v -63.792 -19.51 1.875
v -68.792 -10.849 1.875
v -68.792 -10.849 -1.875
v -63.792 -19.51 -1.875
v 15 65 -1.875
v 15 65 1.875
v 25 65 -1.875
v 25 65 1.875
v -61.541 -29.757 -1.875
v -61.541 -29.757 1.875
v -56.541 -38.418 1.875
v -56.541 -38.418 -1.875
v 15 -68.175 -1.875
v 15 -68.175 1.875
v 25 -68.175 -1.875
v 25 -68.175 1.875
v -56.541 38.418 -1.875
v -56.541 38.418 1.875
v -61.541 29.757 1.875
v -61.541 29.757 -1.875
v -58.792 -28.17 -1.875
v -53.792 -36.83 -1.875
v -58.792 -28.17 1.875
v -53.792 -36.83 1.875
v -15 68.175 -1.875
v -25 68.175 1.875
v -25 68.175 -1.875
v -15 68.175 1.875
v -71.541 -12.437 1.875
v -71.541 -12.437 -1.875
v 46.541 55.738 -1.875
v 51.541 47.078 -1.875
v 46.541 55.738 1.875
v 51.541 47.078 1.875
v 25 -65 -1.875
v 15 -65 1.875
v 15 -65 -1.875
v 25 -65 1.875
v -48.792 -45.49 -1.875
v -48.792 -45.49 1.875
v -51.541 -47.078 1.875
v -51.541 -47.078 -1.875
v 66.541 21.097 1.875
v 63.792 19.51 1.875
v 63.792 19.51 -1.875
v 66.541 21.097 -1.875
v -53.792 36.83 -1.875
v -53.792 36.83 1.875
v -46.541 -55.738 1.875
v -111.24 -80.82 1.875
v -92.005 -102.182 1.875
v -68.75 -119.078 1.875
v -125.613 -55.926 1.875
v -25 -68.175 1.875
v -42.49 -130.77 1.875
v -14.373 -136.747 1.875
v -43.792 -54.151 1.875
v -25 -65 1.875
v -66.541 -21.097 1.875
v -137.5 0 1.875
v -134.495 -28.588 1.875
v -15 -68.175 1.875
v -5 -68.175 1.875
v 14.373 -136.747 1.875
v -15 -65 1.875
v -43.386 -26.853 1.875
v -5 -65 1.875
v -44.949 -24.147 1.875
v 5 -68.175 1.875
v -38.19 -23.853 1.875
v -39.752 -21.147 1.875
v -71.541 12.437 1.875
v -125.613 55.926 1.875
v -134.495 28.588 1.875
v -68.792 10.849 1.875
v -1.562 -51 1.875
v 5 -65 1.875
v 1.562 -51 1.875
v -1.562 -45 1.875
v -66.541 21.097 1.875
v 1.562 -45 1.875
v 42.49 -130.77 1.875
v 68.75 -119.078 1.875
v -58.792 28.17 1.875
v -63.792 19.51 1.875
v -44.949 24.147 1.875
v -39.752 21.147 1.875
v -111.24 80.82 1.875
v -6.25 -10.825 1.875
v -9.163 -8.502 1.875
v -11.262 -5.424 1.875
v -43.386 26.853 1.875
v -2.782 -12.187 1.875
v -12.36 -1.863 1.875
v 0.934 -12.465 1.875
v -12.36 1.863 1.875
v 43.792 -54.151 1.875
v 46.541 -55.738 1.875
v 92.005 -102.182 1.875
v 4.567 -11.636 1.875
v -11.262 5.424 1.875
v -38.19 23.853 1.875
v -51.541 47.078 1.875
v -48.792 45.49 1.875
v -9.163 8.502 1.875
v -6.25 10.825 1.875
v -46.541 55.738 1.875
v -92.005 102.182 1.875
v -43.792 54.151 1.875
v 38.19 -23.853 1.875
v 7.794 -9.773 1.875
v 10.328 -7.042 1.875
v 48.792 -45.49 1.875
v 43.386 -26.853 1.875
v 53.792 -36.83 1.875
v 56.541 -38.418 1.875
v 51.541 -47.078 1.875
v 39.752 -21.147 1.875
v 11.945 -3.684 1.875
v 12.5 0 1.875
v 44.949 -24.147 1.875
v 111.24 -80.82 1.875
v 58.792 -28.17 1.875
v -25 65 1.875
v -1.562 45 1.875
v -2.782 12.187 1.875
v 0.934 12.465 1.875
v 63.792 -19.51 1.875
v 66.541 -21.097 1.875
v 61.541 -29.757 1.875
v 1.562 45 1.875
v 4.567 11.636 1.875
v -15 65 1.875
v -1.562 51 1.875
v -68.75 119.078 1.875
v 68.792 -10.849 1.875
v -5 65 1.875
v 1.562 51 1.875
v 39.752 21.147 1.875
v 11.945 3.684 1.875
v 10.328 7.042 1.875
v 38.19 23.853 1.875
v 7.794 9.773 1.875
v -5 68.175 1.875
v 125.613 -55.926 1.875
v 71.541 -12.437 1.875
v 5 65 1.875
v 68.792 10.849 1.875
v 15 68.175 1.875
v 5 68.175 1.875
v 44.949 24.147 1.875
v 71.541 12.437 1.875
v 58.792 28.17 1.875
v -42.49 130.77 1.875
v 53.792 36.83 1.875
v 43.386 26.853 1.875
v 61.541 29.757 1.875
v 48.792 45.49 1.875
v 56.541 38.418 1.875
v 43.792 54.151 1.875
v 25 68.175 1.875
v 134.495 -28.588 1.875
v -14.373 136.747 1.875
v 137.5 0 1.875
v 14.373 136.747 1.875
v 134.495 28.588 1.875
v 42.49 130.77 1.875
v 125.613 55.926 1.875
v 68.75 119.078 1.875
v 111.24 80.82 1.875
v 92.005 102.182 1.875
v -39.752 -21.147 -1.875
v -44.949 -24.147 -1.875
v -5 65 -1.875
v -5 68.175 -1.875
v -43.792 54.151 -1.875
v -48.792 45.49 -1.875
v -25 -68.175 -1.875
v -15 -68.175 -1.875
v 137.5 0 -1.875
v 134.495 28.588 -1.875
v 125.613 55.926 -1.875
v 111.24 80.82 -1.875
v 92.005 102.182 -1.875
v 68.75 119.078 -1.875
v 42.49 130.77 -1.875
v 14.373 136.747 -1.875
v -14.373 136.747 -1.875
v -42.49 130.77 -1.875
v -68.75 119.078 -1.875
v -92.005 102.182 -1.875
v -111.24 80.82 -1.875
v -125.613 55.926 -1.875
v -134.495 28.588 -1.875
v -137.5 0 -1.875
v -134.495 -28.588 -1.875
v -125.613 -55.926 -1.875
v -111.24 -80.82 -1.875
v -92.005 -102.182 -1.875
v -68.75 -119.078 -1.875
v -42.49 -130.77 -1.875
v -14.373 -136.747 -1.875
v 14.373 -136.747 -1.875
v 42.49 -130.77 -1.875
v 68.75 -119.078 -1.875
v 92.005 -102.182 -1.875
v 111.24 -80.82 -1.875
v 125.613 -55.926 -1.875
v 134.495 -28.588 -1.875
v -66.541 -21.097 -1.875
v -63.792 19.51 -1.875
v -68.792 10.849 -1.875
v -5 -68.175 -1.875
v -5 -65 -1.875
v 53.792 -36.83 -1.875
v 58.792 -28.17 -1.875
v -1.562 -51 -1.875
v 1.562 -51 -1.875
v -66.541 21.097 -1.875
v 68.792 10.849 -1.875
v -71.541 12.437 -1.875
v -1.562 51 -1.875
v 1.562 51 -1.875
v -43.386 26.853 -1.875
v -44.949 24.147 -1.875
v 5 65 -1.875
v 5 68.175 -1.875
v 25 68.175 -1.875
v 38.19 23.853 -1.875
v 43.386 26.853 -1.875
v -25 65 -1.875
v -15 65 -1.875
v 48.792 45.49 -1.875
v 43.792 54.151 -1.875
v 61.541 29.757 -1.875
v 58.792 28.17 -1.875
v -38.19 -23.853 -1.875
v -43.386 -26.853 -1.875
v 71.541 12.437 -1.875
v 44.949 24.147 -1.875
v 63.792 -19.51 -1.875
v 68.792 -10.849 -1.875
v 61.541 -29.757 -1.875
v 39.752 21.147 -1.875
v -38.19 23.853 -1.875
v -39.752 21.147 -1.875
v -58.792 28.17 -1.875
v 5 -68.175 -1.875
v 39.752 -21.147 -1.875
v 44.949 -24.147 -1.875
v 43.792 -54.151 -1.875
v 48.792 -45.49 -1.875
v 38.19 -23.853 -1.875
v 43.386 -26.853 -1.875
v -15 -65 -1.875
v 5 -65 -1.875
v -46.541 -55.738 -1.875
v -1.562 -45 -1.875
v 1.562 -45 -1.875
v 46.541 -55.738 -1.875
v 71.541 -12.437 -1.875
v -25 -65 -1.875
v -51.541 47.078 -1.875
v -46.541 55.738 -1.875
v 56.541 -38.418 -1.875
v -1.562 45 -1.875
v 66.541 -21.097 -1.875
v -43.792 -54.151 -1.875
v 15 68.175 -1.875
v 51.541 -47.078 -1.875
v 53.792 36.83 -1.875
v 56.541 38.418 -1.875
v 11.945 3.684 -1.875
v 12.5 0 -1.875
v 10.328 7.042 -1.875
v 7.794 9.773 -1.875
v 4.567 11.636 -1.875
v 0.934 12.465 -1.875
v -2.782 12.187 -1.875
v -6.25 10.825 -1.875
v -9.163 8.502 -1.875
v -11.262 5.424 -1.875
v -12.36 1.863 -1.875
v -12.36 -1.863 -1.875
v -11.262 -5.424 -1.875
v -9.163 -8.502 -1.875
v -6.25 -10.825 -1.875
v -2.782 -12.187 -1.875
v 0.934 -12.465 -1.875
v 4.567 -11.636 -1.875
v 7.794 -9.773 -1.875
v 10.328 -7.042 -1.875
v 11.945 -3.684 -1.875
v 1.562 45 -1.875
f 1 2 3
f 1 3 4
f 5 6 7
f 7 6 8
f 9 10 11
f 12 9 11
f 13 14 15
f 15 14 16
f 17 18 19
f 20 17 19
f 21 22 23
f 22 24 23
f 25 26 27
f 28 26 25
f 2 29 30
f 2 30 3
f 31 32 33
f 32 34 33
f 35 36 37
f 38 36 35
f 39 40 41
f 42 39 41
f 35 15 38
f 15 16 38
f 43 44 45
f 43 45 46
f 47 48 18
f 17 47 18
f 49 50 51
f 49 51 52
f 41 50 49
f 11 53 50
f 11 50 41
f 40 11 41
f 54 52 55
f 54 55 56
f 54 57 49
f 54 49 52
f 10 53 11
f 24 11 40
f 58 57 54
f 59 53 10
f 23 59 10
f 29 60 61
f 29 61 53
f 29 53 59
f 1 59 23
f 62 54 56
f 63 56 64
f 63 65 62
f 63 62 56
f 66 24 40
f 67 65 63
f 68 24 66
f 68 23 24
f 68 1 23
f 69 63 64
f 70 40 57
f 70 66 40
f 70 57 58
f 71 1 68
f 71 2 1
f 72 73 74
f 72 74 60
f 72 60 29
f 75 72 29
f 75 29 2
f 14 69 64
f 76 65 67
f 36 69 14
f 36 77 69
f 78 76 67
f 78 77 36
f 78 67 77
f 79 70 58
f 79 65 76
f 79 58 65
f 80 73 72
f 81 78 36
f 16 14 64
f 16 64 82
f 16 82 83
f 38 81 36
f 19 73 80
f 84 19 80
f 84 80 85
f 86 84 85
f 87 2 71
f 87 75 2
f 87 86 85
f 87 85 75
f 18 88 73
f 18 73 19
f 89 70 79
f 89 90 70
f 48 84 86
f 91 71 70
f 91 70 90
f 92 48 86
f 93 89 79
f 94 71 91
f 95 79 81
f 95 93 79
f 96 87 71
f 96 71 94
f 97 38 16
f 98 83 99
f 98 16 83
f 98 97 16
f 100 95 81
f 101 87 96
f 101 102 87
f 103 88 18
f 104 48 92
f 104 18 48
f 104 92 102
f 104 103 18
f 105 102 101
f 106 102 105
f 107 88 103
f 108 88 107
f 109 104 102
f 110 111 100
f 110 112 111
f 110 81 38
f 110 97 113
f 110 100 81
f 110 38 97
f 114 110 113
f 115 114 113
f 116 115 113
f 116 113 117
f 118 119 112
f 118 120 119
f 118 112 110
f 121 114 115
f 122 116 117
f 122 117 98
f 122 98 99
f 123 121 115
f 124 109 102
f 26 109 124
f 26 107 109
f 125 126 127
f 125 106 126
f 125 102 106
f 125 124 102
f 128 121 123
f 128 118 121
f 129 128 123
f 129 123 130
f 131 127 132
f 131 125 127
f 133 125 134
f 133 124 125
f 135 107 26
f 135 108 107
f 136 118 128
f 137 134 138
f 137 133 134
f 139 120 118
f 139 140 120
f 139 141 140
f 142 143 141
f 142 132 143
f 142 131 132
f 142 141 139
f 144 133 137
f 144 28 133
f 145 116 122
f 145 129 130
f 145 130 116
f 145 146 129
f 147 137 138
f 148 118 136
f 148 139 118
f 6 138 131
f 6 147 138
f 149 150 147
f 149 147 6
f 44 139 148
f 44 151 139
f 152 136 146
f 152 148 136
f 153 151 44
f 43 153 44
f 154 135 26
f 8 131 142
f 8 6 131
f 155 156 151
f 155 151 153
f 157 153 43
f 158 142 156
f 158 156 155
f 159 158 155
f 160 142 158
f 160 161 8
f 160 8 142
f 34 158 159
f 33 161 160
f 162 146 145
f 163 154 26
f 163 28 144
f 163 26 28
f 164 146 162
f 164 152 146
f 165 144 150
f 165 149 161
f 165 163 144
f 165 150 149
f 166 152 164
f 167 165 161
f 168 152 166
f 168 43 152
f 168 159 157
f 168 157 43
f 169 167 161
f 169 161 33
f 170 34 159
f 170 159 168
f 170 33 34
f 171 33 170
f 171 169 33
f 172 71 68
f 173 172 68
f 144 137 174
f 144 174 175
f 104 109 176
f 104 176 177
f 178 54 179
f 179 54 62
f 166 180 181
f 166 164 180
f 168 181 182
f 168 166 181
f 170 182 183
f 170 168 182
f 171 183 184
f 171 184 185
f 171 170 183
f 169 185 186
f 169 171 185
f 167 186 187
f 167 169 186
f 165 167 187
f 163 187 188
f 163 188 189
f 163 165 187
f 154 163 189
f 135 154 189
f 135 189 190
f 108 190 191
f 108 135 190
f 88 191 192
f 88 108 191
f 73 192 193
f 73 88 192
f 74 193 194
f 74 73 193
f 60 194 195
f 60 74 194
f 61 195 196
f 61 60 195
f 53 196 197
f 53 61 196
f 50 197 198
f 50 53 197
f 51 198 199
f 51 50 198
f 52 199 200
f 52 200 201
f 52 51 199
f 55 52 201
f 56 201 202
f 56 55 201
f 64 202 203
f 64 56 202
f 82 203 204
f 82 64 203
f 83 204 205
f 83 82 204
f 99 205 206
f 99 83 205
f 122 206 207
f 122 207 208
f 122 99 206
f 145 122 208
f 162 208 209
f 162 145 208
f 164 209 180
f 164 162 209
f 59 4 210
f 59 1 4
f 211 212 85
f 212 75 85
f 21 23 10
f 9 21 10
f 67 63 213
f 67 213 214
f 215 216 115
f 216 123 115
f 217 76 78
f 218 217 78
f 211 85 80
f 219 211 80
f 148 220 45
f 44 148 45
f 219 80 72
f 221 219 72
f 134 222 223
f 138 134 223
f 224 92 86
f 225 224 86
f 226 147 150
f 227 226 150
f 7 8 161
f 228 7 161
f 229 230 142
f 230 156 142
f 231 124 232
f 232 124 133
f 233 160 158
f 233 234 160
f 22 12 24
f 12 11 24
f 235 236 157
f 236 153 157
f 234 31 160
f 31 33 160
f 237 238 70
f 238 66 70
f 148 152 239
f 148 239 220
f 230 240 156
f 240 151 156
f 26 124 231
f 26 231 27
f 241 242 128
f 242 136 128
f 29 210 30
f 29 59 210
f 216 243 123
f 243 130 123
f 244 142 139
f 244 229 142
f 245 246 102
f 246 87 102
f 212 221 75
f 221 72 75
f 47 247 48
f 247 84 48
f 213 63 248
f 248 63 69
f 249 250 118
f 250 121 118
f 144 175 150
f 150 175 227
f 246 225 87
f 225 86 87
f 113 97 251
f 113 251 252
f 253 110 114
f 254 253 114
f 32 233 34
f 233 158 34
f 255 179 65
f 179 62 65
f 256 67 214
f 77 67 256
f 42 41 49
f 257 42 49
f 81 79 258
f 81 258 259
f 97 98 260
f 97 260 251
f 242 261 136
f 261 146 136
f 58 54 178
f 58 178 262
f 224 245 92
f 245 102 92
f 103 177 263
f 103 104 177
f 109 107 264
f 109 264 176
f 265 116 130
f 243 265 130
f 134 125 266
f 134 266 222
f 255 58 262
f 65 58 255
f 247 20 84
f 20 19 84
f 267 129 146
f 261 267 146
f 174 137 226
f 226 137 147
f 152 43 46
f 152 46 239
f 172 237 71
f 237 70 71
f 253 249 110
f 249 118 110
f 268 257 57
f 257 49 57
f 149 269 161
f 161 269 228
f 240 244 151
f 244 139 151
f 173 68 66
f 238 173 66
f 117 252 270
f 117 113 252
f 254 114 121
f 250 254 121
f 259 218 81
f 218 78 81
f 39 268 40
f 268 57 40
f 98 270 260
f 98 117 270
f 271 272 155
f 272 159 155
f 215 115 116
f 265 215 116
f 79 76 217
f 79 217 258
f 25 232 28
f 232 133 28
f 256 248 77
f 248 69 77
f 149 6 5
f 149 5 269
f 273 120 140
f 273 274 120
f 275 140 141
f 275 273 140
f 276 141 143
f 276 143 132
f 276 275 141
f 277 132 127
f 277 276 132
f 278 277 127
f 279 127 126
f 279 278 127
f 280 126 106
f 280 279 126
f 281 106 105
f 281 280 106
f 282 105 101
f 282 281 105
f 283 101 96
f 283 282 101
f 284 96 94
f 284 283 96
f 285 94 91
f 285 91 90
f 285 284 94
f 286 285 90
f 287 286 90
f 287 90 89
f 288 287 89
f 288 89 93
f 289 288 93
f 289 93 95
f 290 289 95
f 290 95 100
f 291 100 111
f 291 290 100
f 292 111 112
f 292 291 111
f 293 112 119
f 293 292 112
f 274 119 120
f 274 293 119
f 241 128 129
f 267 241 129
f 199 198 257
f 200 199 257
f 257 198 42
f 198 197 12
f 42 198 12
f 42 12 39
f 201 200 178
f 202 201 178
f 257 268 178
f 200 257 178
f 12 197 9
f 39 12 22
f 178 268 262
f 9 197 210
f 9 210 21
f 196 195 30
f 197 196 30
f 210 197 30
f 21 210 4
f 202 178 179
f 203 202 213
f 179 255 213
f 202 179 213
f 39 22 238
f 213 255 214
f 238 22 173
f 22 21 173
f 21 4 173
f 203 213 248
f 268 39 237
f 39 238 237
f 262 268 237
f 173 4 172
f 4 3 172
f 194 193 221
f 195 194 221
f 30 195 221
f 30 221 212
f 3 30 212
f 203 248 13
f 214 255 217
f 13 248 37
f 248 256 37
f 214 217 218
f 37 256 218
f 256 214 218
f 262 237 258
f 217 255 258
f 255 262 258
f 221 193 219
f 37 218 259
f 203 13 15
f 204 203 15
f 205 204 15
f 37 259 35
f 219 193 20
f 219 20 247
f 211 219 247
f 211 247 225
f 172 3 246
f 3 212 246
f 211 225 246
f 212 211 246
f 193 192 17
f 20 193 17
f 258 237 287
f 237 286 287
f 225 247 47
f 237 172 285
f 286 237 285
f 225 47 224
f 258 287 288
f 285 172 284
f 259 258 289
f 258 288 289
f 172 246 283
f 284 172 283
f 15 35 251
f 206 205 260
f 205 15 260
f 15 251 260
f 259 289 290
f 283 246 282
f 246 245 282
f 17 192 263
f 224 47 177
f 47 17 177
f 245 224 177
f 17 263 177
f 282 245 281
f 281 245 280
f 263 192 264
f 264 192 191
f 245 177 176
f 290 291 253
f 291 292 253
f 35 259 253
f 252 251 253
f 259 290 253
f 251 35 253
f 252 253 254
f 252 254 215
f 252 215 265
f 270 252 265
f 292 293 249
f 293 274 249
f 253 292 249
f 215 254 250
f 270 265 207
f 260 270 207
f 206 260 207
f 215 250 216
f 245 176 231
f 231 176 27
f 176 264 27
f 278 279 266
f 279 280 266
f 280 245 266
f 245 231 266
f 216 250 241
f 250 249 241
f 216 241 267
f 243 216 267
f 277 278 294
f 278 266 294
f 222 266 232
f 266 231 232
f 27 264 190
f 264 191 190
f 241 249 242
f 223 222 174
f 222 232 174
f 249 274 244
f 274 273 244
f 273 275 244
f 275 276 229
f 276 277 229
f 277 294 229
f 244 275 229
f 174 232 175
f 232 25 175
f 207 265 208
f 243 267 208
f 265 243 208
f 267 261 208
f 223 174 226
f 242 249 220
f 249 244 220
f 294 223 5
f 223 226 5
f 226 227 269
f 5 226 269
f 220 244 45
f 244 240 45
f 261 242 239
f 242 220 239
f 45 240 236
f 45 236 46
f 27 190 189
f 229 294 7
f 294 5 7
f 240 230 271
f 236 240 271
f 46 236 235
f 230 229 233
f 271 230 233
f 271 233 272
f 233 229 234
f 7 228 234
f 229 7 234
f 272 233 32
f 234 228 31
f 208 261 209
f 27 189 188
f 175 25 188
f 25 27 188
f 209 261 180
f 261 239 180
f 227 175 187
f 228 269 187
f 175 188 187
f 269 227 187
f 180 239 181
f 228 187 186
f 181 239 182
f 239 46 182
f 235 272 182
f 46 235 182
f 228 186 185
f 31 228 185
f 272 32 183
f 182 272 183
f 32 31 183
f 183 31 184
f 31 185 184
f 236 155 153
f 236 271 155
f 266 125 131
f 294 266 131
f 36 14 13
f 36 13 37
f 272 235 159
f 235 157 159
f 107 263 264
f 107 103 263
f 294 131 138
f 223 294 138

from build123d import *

# Parameters (mm, degrees)
SKETCH1_R           = 137.5
SKETCH1_R_2         = 12.5
SKETCH1_W           = 10
SKETCH1_H           = 3.175
SKETCH1_W_2         = 3.125
SKETCH1_H_2         = 6
BOSS_EXTRUDE1_DEPTH = 1.875


with BuildPart() as part:
    # Sketch1 → Boss-Extrude1 (new body, symmetric)
    with BuildSketch(Plane.XY):
        Circle(SKETCH1_R)
        Circle(SKETCH1_R_2, mode=Mode.SUBTRACT)
        with Locations((0, 66.5875)):
            Rectangle(SKETCH1_W, SKETCH1_H, mode=Mode.SUBTRACT)
        with Locations((-20, 66.5875)):
            Rectangle(SKETCH1_W, SKETCH1_H, mode=Mode.SUBTRACT)
        with Locations((20, 66.5875)):
            Rectangle(SKETCH1_W, SKETCH1_H, mode=Mode.SUBTRACT)
        with Locations((0, 48)):
            Rectangle(SKETCH1_W_2, SKETCH1_H_2, mode=Mode.SUBTRACT)
        Polygon((61.541281903, 29.757372981), (56.541281903, 38.417627019), (53.791651246, 36.830127019), (58.791651246, 28.169872981), align=None, mode=Mode.SUBTRACT)
        Polygon((51.541281903, 47.077881057), (46.541281903, 55.738135095), (43.791651246, 54.150635095), (48.791651246, 45.490381057), align=None, mode=Mode.SUBTRACT)
        Polygon((71.541281903, 12.436864905), (68.791651246, 10.849364905), (63.791651246, 19.509618943), (66.541281903, 21.097118943), align=None, mode=Mode.SUBTRACT)
        Polygon((44.948545593, 24.146835307), (43.386045593, 26.853164693), (38.18989317, 23.853164693), (39.75239317, 21.146835307), align=None, mode=Mode.SUBTRACT)
        Polygon((56.541281903, -38.417627019), (61.541281903, -29.757372981), (58.791651246, -28.169872981), (53.791651246, -36.830127019), align=None, mode=Mode.SUBTRACT)
        Polygon((66.541281903, -21.097118943), (71.541281903, -12.436864905), (68.791651246, -10.849364905), (63.791651246, -19.509618943), align=None, mode=Mode.SUBTRACT)
        Polygon((46.541281903, -55.738135095), (43.791651246, -54.150635095), (48.791651246, -45.490381057), (51.541281903, -47.077881057), align=None, mode=Mode.SUBTRACT)
        Polygon((43.386045593, -26.853164693), (44.948545593, -24.146835307), (39.75239317, -21.146835307), (38.18989317, -23.853164693), align=None, mode=Mode.SUBTRACT)
        with Locations((0, -66.5875)):
            Rectangle(SKETCH1_W, SKETCH1_H, mode=Mode.SUBTRACT)
        with Locations((20, -66.5875)):
            Rectangle(SKETCH1_W, SKETCH1_H, mode=Mode.SUBTRACT)
        with Locations((-20, -66.5875)):
            Rectangle(SKETCH1_W, SKETCH1_H, mode=Mode.SUBTRACT)
        with Locations((0, -48)):
            Rectangle(SKETCH1_W_2, SKETCH1_H_2, mode=Mode.SUBTRACT)
        Polygon((-61.541281903, -29.757372981), (-56.541281903, -38.417627019), (-53.791651246, -36.830127019), (-58.791651246, -28.169872981), align=None, mode=Mode.SUBTRACT)
        Polygon((-51.541281903, -47.077881057), (-46.541281903, -55.738135095), (-43.791651246, -54.150635095), (-48.791651246, -45.490381057), align=None, mode=Mode.SUBTRACT)
        Polygon((-71.541281903, -12.436864905), (-68.791651246, -10.849364905), (-63.791651246, -19.509618943), (-66.541281903, -21.097118943), align=None, mode=Mode.SUBTRACT)
        Polygon((-44.948545593, -24.146835307), (-43.386045593, -26.853164693), (-38.18989317, -23.853164693), (-39.75239317, -21.146835307), align=None, mode=Mode.SUBTRACT)
        Polygon((-56.541281903, 38.417627019), (-61.541281903, 29.757372981), (-58.791651246, 28.169872981), (-53.791651246, 36.830127019), align=None, mode=Mode.SUBTRACT)
        Polygon((-66.541281903, 21.097118943), (-71.541281903, 12.436864905), (-68.791651246, 10.849364905), (-63.791651246, 19.509618943), align=None, mode=Mode.SUBTRACT)
        Polygon((-46.541281903, 55.738135095), (-43.791651246, 54.150635095), (-48.791651246, 45.490381057), (-51.541281903, 47.077881057), align=None, mode=Mode.SUBTRACT)
        Polygon((-43.386045593, 26.853164693), (-44.948545593, 24.146835307), (-39.75239317, 21.146835307), (-38.18989317, 23.853164693), align=None, mode=Mode.SUBTRACT)
    extrude(amount=BOSS_EXTRUDE1_DEPTH, both=True)


solid = part.part
